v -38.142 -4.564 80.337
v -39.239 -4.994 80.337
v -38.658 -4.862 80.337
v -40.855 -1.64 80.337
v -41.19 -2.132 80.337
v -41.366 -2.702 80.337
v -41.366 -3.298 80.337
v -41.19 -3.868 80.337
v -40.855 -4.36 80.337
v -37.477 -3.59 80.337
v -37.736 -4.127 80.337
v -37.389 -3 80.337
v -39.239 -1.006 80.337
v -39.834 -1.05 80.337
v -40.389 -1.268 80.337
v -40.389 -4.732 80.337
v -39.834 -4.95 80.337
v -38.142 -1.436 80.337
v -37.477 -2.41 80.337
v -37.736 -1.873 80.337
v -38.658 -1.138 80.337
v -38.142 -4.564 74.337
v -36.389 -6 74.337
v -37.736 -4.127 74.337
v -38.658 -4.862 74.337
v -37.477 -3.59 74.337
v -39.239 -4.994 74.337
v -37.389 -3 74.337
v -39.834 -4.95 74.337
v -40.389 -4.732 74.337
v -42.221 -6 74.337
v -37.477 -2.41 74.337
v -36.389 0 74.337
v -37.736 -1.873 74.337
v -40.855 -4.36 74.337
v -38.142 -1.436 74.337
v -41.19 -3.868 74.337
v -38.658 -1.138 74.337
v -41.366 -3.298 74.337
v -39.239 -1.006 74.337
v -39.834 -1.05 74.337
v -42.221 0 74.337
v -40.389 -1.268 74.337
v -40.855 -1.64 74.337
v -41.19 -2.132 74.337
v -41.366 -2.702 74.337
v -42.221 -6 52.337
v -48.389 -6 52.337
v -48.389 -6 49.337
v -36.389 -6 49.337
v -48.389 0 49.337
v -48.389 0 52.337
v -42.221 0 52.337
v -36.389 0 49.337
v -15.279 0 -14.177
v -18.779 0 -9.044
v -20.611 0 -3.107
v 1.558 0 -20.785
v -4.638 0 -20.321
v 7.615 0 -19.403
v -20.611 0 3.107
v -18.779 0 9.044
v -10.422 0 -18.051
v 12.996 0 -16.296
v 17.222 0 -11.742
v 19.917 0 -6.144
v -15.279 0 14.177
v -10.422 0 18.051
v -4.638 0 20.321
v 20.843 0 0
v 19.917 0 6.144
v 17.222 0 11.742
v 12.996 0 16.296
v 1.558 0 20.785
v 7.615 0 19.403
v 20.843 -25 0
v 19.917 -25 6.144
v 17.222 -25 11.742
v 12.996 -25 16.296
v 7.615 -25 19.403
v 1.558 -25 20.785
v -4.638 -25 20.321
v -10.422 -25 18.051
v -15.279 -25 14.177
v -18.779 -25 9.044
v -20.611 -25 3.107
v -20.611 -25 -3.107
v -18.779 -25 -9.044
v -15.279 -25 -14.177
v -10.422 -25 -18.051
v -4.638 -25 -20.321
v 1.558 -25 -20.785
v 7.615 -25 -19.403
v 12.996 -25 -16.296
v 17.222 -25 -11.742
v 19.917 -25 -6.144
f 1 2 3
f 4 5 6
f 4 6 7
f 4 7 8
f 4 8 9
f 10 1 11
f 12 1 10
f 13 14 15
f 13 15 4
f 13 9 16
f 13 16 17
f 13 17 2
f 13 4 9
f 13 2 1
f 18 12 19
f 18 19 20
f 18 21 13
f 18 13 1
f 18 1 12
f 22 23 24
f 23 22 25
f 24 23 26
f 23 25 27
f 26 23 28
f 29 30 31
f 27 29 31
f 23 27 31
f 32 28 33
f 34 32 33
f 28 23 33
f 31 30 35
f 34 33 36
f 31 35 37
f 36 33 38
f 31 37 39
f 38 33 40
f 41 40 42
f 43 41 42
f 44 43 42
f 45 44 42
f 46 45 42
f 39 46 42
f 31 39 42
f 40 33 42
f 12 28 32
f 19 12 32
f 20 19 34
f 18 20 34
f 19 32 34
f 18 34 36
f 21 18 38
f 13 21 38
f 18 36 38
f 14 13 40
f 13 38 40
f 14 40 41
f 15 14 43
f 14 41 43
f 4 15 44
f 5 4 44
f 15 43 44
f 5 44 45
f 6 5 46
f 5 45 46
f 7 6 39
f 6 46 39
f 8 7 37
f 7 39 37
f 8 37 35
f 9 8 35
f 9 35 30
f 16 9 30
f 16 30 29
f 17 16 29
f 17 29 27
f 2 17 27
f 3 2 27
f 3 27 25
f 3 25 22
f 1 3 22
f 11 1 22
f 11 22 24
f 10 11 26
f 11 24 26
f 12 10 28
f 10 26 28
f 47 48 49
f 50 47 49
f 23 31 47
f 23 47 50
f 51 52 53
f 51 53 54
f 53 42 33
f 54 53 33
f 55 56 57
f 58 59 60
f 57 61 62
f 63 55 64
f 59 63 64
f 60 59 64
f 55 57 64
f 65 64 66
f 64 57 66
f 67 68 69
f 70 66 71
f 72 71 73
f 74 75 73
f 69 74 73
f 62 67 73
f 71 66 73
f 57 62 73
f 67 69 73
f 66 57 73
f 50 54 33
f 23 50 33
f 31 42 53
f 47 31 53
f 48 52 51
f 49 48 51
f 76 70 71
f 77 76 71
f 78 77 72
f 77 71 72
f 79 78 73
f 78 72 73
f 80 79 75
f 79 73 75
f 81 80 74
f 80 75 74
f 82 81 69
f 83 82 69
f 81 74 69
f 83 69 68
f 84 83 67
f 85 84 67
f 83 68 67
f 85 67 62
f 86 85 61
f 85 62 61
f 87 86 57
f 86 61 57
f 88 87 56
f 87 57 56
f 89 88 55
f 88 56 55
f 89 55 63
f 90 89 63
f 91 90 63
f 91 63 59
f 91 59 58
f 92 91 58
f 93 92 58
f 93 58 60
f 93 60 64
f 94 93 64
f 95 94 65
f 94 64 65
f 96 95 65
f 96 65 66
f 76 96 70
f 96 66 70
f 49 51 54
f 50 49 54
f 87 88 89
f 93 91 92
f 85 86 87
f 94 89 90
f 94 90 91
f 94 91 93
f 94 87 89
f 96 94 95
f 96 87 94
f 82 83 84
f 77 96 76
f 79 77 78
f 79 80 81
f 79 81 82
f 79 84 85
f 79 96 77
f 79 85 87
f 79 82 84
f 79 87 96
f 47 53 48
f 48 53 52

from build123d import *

# Parameters (mm, degrees)
F0_R     = 20.843436
F1_DEPTH = 25
F3_DEPTH = 6
F4_R     = 2
F5_DEPTH = 6


with BuildPart() as f1:
    # F0 (on Front) → F1 (new body)
    with BuildSketch(Plane.XZ):
        Circle(F0_R)
    extrude(amount=F1_DEPTH)


with BuildPart() as f3:
    # F2 (on Front) → F3 (new body)
    with BuildSketch(Plane.XZ):
        Polygon((-36.388556, 49.337354), (-36.388556, 74.337354), (-42.221386, 74.337354), (-42.221386, 52.337354), (-48.388556, 52.337354), (-48.388556, 49.337354), align=None)
    extrude(amount=F3_DEPTH)

    # F4 (on face) → F5 (join)
    with BuildSketch(Plane.XY.offset(74.337354)):
        with Locations((-39.388556, -3)):
            Circle(F4_R)
    extrude(amount=F5_DEPTH)


solid = Compound([f1.part, f3.part])
